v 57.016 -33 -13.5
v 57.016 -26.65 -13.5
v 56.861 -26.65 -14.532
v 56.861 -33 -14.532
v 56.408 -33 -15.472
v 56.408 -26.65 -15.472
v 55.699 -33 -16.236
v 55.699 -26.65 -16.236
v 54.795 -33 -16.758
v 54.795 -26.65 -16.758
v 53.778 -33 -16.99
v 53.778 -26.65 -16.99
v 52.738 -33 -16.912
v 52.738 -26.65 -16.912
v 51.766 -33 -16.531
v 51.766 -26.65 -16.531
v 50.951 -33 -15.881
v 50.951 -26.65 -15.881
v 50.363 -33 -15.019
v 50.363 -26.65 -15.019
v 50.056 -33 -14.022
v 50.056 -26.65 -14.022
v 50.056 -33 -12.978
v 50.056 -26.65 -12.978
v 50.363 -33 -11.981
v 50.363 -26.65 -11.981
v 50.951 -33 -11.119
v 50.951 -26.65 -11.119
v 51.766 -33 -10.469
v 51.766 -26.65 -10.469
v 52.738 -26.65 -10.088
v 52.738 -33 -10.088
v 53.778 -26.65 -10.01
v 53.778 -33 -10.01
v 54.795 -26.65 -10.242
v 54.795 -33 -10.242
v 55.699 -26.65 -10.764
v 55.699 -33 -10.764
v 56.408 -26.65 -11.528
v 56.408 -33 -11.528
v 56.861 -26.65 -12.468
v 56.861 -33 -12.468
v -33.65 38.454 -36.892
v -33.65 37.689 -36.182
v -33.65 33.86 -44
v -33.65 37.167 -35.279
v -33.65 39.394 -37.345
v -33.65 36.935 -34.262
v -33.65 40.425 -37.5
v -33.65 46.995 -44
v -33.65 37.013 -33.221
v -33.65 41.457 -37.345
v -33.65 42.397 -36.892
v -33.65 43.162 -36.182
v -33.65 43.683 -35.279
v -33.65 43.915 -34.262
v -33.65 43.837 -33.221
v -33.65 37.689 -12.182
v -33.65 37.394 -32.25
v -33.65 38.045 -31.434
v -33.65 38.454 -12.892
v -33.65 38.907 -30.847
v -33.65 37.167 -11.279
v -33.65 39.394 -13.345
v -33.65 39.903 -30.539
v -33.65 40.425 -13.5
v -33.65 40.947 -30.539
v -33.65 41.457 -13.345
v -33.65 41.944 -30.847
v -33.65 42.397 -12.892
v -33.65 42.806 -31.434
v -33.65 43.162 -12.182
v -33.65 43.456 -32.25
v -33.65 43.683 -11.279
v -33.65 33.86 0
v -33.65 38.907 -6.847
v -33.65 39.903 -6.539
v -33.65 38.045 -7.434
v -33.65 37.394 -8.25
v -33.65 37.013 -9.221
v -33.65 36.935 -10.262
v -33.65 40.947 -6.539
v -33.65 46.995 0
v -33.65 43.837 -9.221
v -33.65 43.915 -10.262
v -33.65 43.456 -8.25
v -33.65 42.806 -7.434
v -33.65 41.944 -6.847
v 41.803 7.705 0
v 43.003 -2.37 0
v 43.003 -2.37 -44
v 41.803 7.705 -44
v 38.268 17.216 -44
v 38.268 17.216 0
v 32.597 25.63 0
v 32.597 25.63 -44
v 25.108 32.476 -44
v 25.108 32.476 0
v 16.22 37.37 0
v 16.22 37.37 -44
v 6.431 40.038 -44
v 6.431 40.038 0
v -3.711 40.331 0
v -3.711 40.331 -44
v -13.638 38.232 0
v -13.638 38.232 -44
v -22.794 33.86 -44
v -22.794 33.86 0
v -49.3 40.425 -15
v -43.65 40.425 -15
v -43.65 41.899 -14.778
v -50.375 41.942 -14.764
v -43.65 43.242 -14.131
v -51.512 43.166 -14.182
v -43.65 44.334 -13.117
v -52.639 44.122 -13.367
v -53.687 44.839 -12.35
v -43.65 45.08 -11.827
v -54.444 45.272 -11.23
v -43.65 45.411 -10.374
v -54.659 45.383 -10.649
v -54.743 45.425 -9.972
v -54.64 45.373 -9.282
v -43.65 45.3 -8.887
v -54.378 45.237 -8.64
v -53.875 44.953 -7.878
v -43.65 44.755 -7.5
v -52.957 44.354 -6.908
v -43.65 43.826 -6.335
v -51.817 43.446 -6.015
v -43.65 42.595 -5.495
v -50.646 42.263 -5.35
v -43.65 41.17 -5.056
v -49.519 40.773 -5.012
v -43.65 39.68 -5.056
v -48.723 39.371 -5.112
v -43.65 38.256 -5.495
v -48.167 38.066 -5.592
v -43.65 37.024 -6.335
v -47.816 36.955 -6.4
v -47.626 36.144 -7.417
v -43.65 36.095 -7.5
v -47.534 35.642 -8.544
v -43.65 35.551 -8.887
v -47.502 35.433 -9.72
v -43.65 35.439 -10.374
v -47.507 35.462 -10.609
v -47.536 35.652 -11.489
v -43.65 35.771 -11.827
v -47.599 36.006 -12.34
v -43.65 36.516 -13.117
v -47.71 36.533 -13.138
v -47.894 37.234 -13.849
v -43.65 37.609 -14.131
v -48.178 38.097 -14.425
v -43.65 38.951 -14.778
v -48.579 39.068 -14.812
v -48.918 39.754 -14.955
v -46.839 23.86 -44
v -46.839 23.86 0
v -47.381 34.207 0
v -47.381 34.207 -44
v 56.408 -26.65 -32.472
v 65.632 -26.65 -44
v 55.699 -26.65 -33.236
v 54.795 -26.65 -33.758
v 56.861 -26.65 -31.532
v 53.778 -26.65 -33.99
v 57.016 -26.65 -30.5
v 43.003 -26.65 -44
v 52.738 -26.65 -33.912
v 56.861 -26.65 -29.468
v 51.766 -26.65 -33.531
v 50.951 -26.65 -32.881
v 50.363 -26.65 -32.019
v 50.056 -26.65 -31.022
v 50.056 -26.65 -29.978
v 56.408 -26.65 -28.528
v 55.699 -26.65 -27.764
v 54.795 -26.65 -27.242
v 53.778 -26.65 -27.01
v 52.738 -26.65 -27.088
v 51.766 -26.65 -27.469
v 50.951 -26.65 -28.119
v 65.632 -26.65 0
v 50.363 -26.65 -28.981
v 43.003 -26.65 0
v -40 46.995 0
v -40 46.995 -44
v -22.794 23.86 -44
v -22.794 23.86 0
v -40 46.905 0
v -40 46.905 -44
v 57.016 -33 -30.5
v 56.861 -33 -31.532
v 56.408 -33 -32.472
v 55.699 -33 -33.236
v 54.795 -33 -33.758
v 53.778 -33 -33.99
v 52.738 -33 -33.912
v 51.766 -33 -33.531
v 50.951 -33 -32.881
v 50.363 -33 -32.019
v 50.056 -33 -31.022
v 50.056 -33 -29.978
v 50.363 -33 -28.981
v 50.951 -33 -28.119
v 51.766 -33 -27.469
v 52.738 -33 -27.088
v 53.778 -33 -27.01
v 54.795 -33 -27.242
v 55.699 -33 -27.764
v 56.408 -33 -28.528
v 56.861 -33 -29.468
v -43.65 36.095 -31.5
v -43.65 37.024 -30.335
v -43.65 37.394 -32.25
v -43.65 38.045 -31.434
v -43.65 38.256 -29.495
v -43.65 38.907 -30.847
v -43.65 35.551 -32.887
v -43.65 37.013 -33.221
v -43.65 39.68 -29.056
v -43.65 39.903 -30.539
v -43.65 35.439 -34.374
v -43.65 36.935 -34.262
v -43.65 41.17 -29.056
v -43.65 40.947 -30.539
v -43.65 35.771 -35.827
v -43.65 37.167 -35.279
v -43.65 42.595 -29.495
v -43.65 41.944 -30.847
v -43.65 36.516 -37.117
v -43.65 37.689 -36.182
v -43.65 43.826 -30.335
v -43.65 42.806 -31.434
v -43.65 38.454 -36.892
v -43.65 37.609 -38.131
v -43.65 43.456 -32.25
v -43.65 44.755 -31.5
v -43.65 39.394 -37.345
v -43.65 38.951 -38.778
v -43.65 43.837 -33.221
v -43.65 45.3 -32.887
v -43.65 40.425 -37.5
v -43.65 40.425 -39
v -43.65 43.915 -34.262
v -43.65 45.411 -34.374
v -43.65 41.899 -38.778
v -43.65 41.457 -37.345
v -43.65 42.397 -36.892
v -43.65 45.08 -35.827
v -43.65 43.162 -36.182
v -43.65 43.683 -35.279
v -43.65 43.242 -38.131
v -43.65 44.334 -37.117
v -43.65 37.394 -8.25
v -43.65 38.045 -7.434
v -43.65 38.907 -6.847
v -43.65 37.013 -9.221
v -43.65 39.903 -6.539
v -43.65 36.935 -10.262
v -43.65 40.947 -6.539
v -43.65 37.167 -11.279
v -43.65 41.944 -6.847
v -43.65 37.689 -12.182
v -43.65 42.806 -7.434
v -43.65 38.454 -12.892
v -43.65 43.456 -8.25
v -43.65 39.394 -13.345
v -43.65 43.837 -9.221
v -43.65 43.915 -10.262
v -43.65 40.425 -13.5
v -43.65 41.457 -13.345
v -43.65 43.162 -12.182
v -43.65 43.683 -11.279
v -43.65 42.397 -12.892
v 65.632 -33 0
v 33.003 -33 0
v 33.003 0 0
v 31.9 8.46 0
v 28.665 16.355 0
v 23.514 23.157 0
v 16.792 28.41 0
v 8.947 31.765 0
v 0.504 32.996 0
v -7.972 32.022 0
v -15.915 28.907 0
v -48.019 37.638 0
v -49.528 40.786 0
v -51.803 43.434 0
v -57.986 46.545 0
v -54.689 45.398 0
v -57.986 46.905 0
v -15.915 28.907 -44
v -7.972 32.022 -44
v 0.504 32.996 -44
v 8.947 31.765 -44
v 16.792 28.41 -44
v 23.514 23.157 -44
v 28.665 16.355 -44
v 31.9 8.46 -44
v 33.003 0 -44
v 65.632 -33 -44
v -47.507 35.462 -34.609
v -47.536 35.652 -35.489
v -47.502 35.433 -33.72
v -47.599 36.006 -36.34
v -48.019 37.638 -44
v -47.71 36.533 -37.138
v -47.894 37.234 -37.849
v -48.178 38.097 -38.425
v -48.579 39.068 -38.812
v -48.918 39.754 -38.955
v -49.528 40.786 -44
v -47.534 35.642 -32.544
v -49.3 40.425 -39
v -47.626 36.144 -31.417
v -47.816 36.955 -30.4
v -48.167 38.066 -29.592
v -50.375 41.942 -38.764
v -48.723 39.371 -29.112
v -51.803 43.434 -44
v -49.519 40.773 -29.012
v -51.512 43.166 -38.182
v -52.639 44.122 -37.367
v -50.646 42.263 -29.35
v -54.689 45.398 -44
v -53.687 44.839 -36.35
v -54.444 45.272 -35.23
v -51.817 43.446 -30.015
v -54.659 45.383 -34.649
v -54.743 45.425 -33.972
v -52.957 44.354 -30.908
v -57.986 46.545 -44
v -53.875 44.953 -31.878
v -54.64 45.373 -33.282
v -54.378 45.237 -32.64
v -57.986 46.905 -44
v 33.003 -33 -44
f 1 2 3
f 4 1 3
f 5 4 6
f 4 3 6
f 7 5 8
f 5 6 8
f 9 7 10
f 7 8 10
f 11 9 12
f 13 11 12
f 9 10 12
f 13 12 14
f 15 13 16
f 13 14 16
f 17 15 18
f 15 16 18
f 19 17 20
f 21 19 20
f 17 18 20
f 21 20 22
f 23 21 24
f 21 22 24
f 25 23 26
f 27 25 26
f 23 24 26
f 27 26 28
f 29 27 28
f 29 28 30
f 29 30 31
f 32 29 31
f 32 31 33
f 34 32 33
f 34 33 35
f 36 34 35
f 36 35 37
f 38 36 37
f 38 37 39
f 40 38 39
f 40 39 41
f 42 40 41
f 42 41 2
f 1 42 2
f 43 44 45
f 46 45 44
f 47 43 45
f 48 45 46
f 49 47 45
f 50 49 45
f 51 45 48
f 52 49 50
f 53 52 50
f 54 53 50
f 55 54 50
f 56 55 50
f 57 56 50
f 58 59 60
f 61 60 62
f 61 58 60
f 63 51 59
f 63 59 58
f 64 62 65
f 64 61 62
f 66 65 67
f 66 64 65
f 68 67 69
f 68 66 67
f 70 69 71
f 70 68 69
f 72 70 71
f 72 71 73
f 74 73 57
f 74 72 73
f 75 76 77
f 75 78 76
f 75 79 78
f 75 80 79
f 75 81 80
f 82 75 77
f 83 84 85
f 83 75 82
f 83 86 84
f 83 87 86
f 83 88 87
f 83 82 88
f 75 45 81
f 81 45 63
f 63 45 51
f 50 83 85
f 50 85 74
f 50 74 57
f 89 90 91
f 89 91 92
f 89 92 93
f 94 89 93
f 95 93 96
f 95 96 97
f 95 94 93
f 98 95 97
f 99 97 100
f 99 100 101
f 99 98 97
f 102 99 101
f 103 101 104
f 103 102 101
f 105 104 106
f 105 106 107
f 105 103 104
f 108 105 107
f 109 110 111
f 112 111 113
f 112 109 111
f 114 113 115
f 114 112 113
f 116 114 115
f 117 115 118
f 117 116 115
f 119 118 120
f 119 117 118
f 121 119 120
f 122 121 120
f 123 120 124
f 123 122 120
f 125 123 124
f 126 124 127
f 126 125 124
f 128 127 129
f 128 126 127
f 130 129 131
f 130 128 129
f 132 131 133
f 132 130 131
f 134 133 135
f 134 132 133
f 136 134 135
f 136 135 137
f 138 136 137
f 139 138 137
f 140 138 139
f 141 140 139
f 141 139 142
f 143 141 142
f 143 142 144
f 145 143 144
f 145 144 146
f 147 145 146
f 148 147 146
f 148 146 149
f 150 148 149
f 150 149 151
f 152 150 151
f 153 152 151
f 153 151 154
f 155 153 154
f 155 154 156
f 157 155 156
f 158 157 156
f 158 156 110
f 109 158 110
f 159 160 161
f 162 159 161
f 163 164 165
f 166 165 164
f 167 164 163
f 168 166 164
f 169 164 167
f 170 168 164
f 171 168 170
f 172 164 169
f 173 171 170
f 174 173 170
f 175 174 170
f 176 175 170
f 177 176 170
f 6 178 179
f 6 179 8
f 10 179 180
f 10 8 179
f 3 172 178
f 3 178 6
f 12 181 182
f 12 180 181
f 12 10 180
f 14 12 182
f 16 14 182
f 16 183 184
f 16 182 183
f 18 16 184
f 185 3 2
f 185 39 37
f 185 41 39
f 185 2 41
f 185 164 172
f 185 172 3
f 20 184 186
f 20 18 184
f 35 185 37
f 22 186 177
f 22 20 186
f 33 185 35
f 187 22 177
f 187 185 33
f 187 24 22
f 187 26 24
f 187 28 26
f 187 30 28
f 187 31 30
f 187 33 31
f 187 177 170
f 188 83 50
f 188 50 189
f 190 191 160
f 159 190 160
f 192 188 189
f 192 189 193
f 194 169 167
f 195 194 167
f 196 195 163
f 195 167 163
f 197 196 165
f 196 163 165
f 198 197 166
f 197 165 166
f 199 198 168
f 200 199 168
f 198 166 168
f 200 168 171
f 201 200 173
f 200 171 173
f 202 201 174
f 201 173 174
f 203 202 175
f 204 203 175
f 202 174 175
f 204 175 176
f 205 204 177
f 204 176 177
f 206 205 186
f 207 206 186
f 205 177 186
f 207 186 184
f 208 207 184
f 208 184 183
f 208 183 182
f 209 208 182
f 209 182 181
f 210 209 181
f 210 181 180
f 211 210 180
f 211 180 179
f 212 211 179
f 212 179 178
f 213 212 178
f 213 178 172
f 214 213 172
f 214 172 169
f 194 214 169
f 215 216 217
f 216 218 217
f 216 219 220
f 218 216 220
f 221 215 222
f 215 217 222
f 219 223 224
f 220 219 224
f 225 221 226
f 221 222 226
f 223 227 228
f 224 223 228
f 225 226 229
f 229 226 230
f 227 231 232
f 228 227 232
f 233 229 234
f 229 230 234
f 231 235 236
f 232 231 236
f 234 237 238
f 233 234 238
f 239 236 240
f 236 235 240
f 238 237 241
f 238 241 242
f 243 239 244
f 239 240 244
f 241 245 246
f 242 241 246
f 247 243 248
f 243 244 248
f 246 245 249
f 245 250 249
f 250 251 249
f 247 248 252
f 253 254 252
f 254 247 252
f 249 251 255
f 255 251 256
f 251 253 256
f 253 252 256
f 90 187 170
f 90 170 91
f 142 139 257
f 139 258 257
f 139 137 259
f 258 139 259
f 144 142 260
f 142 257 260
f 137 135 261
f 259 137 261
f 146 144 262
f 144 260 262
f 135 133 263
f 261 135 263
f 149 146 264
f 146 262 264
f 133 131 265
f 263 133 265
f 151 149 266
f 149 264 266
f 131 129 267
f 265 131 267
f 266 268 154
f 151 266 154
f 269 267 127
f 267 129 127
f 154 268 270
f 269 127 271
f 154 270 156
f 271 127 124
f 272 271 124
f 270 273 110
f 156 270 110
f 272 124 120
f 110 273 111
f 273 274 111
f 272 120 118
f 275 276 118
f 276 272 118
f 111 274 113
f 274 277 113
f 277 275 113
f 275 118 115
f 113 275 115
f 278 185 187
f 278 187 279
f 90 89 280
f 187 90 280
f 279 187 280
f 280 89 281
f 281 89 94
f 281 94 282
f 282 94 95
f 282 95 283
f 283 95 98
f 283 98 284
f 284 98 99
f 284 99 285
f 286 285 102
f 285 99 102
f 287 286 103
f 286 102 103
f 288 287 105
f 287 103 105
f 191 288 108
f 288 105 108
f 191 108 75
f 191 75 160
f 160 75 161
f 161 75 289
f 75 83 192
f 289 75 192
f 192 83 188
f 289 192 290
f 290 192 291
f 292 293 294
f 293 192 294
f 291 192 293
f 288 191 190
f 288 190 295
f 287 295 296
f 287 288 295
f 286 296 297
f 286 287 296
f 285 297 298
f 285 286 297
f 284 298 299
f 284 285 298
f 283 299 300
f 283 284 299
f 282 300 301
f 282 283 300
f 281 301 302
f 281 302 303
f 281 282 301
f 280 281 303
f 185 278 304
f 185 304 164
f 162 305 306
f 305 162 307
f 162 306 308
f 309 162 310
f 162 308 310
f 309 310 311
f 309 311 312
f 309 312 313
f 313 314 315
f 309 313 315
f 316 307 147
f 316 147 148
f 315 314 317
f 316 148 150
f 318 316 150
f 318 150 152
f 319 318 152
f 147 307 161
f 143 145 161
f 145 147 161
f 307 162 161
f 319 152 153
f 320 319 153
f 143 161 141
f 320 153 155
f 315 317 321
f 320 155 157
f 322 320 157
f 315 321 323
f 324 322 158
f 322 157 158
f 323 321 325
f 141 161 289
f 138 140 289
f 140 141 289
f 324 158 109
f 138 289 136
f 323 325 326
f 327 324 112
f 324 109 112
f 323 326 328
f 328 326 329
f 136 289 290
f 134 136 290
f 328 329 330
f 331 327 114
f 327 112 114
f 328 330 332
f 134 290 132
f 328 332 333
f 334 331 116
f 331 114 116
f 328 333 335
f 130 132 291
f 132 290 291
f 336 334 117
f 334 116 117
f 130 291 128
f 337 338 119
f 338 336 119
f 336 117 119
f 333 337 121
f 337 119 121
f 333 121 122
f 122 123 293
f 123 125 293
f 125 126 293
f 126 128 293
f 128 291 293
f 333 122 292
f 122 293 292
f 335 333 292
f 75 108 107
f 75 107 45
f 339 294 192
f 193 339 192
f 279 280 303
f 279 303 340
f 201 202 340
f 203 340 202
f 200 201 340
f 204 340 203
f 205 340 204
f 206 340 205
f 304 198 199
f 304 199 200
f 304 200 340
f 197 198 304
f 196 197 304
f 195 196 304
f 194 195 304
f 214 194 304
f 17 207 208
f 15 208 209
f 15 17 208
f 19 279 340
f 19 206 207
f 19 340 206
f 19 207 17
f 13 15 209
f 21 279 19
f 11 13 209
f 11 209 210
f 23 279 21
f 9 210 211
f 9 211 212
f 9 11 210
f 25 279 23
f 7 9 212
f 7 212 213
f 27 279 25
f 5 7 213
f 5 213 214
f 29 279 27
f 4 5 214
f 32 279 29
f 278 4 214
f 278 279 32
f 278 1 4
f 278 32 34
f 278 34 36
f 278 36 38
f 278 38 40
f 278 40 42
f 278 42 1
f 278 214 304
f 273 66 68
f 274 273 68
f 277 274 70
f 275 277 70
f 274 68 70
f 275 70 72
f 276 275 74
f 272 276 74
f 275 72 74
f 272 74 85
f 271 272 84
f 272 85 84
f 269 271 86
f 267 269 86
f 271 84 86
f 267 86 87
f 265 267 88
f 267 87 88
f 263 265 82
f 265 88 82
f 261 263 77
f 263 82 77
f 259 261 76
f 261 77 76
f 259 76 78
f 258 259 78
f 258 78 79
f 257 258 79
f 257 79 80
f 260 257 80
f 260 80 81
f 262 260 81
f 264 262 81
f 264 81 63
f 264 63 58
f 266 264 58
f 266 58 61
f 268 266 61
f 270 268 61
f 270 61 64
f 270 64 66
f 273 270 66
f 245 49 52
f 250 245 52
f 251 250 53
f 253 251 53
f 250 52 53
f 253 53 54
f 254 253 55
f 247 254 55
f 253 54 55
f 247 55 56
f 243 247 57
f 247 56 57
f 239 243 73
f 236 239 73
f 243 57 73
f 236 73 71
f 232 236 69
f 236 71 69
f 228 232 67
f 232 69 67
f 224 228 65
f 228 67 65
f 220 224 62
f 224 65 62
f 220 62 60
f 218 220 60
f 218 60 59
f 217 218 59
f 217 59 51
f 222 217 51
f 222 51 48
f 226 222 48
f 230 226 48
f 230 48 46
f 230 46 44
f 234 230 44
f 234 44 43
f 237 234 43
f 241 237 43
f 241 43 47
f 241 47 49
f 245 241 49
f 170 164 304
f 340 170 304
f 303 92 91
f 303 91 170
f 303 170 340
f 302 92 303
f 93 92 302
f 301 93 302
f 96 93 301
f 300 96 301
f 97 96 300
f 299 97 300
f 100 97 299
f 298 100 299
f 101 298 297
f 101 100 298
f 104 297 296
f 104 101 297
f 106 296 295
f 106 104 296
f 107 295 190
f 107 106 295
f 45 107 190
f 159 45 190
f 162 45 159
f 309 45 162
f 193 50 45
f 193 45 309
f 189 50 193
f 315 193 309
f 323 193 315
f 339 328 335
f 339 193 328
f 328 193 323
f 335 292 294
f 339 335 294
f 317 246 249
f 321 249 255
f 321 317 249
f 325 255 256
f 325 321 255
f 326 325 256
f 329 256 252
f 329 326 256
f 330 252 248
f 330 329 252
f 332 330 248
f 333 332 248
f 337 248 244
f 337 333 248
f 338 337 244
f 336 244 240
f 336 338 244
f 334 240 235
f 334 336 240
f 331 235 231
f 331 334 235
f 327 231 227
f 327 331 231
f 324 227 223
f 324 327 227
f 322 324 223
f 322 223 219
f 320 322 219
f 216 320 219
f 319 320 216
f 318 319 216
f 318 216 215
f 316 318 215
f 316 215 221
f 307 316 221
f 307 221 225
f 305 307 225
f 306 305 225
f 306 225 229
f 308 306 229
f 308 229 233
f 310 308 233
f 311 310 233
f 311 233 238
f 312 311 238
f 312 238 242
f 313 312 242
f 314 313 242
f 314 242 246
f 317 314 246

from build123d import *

# Parameters (mm, degrees)
BOSS_EXTRUDE1_DEPTH = 44
CUT_EXTRUDE1_REACH  = 8.35
SKETCH2_R           = 3.5
BOSS_EXTRUDE2_DEPTH = 44
CUT_EXTRUDE2_REACH  = 26.336
SKETCH5_R           = 3.5
SKETCH6_R           = 5
CUT_EXTRUDE3_DEPTH  = 15


with BuildPart() as part:
    # Sketch1 → Boss-Extrude1 (new body)
    with BuildSketch(Plane.XY):
        with BuildLine():
            Line((33.003348812, 0), (33.003348812, -33))
            Line((33.003348812, -33), (65.632108119, -33))
            Line((65.632108119, -33), (65.632108119, -26.65))
            Line((65.632108119, -26.65), (43.003348812, -26.65))
            Line((43.003348812, -26.65), (43.003348812, -2.369569967))
            ThreePointArc((43.003348812, -2.369569967), (20.809611253, 35.186501293), (-22.793831907, 33.859768466))
            Line((-22.793831907, 33.859768466), (-33.65, 33.859768466))
            Line((-33.65, 33.859768466), (-33.65, 46.995147616))
            Line((-33.65, 46.995147616), (-40, 46.995147616))
            Line((-40, 46.995147616), (-40, 23.859768466))
            Line((-40, 23.859768466), (-22.793831907, 23.859768466))
            ThreePointArc((-22.793831907, 23.859768466), (12.978190551, 30.342272193), (33.003348812, 0))
        make_face()
    extrude(amount=-BOSS_EXTRUDE1_DEPTH)

    # Sketch2 → Cut-Extrude1 (cut, up to next)
    with BuildSketch(Plane(origin=(0, -26.65, 0), x_dir=(1, 0, 0), z_dir=(0, 1, 0)), mode=Mode.PRIVATE) as cut_extrude1_sk1:
        with Locations((53.516422245, 13.5)):
            Circle(SKETCH2_R)
    cut_extrude1_tool1 = extrude(cut_extrude1_sk1.sketch, amount=-CUT_EXTRUDE1_REACH, mode=Mode.PRIVATE) & part.part
    add(cut_extrude1_tool1.solids().sort_by_distance((53.516422, -26.65, -13.5))[0], mode=Mode.SUBTRACT)
    # Sketch2 → Cut-Extrude1 (cut, up to next)
    with BuildSketch(Plane(origin=(0, -26.65, 0), x_dir=(1, 0, 0), z_dir=(0, 1, 0)), mode=Mode.PRIVATE) as cut_extrude1_sk2:
        with Locations((53.516422245, 30.5)):
            Circle(SKETCH2_R)
    cut_extrude1_tool2 = extrude(cut_extrude1_sk2.sketch, amount=-CUT_EXTRUDE1_REACH, mode=Mode.PRIVATE) & part.part
    add(cut_extrude1_tool2.solids().sort_by_distance((53.516422, -26.65, -30.5))[0], mode=Mode.SUBTRACT)

    # Sketch4 → Boss-Extrude2 (add)
    with BuildSketch(Plane.XY):
        with BuildLine():
            Line((-40, 23.859768466), (-46.838602468, 23.859768466))
            Line((-46.838602468, 23.859768466), (-47.380853546, 34.206535409))
            ThreePointArc((-47.380853546, 34.206535409), (-50.578394755, 42.184822071), (-57.98577318, 46.544646919))
            Line((-57.98577318, 46.544646919), (-57.98577318, 46.904796258))
            Line((-57.98577318, 46.904796258), (-47.376426292, 46.904796258))
            Line((-47.376426292, 46.904796258), (-40, 46.904796258))
            Line((-40, 46.904796258), (-40, 23.859768466))
        make_face()
    extrude(amount=-BOSS_EXTRUDE2_DEPTH)

    # Sketch5 → Cut-Extrude2 (cut, up to next)
    with BuildSketch(Plane(origin=(-33.65, 0, 0), x_dir=(0, 0, -1), z_dir=(1, 0, 0)), mode=Mode.PRIVATE) as cut_extrude2_sk1:
        with Locations((10, 40.425147616)):
            Circle(SKETCH5_R)
    cut_extrude2_tool1 = extrude(cut_extrude2_sk1.sketch, amount=-CUT_EXTRUDE2_REACH, mode=Mode.PRIVATE) & part.part
    add(cut_extrude2_tool1.solids().sort_by_distance((-33.65, 40.425148, -10))[0], mode=Mode.SUBTRACT)
    # Sketch5 → Cut-Extrude2 (cut, up to next)
    with BuildSketch(Plane(origin=(-33.65, 0, 0), x_dir=(0, 0, -1), z_dir=(1, 0, 0)), mode=Mode.PRIVATE) as cut_extrude2_sk2:
        with Locations((34, 40.425147616)):
            Circle(SKETCH5_R)
    cut_extrude2_tool2 = extrude(cut_extrude2_sk2.sketch, amount=-CUT_EXTRUDE2_REACH, mode=Mode.PRIVATE) & part.part
    add(cut_extrude2_tool2.solids().sort_by_distance((-33.65, 40.425148, -34))[0], mode=Mode.SUBTRACT)

    # Sketch6 → Cut-Extrude3 (cut)
    with BuildSketch(Plane(origin=(-58.65, 0, 0), x_dir=(0, 0, -1), z_dir=(1, 0, 0))):
        with Locations((34, 40.425147616)):
            Circle(SKETCH6_R)
        with Locations((10, 40.425147616)):
            Circle(SKETCH6_R)
    extrude(amount=CUT_EXTRUDE3_DEPTH, mode=Mode.SUBTRACT)


solid = part.part
